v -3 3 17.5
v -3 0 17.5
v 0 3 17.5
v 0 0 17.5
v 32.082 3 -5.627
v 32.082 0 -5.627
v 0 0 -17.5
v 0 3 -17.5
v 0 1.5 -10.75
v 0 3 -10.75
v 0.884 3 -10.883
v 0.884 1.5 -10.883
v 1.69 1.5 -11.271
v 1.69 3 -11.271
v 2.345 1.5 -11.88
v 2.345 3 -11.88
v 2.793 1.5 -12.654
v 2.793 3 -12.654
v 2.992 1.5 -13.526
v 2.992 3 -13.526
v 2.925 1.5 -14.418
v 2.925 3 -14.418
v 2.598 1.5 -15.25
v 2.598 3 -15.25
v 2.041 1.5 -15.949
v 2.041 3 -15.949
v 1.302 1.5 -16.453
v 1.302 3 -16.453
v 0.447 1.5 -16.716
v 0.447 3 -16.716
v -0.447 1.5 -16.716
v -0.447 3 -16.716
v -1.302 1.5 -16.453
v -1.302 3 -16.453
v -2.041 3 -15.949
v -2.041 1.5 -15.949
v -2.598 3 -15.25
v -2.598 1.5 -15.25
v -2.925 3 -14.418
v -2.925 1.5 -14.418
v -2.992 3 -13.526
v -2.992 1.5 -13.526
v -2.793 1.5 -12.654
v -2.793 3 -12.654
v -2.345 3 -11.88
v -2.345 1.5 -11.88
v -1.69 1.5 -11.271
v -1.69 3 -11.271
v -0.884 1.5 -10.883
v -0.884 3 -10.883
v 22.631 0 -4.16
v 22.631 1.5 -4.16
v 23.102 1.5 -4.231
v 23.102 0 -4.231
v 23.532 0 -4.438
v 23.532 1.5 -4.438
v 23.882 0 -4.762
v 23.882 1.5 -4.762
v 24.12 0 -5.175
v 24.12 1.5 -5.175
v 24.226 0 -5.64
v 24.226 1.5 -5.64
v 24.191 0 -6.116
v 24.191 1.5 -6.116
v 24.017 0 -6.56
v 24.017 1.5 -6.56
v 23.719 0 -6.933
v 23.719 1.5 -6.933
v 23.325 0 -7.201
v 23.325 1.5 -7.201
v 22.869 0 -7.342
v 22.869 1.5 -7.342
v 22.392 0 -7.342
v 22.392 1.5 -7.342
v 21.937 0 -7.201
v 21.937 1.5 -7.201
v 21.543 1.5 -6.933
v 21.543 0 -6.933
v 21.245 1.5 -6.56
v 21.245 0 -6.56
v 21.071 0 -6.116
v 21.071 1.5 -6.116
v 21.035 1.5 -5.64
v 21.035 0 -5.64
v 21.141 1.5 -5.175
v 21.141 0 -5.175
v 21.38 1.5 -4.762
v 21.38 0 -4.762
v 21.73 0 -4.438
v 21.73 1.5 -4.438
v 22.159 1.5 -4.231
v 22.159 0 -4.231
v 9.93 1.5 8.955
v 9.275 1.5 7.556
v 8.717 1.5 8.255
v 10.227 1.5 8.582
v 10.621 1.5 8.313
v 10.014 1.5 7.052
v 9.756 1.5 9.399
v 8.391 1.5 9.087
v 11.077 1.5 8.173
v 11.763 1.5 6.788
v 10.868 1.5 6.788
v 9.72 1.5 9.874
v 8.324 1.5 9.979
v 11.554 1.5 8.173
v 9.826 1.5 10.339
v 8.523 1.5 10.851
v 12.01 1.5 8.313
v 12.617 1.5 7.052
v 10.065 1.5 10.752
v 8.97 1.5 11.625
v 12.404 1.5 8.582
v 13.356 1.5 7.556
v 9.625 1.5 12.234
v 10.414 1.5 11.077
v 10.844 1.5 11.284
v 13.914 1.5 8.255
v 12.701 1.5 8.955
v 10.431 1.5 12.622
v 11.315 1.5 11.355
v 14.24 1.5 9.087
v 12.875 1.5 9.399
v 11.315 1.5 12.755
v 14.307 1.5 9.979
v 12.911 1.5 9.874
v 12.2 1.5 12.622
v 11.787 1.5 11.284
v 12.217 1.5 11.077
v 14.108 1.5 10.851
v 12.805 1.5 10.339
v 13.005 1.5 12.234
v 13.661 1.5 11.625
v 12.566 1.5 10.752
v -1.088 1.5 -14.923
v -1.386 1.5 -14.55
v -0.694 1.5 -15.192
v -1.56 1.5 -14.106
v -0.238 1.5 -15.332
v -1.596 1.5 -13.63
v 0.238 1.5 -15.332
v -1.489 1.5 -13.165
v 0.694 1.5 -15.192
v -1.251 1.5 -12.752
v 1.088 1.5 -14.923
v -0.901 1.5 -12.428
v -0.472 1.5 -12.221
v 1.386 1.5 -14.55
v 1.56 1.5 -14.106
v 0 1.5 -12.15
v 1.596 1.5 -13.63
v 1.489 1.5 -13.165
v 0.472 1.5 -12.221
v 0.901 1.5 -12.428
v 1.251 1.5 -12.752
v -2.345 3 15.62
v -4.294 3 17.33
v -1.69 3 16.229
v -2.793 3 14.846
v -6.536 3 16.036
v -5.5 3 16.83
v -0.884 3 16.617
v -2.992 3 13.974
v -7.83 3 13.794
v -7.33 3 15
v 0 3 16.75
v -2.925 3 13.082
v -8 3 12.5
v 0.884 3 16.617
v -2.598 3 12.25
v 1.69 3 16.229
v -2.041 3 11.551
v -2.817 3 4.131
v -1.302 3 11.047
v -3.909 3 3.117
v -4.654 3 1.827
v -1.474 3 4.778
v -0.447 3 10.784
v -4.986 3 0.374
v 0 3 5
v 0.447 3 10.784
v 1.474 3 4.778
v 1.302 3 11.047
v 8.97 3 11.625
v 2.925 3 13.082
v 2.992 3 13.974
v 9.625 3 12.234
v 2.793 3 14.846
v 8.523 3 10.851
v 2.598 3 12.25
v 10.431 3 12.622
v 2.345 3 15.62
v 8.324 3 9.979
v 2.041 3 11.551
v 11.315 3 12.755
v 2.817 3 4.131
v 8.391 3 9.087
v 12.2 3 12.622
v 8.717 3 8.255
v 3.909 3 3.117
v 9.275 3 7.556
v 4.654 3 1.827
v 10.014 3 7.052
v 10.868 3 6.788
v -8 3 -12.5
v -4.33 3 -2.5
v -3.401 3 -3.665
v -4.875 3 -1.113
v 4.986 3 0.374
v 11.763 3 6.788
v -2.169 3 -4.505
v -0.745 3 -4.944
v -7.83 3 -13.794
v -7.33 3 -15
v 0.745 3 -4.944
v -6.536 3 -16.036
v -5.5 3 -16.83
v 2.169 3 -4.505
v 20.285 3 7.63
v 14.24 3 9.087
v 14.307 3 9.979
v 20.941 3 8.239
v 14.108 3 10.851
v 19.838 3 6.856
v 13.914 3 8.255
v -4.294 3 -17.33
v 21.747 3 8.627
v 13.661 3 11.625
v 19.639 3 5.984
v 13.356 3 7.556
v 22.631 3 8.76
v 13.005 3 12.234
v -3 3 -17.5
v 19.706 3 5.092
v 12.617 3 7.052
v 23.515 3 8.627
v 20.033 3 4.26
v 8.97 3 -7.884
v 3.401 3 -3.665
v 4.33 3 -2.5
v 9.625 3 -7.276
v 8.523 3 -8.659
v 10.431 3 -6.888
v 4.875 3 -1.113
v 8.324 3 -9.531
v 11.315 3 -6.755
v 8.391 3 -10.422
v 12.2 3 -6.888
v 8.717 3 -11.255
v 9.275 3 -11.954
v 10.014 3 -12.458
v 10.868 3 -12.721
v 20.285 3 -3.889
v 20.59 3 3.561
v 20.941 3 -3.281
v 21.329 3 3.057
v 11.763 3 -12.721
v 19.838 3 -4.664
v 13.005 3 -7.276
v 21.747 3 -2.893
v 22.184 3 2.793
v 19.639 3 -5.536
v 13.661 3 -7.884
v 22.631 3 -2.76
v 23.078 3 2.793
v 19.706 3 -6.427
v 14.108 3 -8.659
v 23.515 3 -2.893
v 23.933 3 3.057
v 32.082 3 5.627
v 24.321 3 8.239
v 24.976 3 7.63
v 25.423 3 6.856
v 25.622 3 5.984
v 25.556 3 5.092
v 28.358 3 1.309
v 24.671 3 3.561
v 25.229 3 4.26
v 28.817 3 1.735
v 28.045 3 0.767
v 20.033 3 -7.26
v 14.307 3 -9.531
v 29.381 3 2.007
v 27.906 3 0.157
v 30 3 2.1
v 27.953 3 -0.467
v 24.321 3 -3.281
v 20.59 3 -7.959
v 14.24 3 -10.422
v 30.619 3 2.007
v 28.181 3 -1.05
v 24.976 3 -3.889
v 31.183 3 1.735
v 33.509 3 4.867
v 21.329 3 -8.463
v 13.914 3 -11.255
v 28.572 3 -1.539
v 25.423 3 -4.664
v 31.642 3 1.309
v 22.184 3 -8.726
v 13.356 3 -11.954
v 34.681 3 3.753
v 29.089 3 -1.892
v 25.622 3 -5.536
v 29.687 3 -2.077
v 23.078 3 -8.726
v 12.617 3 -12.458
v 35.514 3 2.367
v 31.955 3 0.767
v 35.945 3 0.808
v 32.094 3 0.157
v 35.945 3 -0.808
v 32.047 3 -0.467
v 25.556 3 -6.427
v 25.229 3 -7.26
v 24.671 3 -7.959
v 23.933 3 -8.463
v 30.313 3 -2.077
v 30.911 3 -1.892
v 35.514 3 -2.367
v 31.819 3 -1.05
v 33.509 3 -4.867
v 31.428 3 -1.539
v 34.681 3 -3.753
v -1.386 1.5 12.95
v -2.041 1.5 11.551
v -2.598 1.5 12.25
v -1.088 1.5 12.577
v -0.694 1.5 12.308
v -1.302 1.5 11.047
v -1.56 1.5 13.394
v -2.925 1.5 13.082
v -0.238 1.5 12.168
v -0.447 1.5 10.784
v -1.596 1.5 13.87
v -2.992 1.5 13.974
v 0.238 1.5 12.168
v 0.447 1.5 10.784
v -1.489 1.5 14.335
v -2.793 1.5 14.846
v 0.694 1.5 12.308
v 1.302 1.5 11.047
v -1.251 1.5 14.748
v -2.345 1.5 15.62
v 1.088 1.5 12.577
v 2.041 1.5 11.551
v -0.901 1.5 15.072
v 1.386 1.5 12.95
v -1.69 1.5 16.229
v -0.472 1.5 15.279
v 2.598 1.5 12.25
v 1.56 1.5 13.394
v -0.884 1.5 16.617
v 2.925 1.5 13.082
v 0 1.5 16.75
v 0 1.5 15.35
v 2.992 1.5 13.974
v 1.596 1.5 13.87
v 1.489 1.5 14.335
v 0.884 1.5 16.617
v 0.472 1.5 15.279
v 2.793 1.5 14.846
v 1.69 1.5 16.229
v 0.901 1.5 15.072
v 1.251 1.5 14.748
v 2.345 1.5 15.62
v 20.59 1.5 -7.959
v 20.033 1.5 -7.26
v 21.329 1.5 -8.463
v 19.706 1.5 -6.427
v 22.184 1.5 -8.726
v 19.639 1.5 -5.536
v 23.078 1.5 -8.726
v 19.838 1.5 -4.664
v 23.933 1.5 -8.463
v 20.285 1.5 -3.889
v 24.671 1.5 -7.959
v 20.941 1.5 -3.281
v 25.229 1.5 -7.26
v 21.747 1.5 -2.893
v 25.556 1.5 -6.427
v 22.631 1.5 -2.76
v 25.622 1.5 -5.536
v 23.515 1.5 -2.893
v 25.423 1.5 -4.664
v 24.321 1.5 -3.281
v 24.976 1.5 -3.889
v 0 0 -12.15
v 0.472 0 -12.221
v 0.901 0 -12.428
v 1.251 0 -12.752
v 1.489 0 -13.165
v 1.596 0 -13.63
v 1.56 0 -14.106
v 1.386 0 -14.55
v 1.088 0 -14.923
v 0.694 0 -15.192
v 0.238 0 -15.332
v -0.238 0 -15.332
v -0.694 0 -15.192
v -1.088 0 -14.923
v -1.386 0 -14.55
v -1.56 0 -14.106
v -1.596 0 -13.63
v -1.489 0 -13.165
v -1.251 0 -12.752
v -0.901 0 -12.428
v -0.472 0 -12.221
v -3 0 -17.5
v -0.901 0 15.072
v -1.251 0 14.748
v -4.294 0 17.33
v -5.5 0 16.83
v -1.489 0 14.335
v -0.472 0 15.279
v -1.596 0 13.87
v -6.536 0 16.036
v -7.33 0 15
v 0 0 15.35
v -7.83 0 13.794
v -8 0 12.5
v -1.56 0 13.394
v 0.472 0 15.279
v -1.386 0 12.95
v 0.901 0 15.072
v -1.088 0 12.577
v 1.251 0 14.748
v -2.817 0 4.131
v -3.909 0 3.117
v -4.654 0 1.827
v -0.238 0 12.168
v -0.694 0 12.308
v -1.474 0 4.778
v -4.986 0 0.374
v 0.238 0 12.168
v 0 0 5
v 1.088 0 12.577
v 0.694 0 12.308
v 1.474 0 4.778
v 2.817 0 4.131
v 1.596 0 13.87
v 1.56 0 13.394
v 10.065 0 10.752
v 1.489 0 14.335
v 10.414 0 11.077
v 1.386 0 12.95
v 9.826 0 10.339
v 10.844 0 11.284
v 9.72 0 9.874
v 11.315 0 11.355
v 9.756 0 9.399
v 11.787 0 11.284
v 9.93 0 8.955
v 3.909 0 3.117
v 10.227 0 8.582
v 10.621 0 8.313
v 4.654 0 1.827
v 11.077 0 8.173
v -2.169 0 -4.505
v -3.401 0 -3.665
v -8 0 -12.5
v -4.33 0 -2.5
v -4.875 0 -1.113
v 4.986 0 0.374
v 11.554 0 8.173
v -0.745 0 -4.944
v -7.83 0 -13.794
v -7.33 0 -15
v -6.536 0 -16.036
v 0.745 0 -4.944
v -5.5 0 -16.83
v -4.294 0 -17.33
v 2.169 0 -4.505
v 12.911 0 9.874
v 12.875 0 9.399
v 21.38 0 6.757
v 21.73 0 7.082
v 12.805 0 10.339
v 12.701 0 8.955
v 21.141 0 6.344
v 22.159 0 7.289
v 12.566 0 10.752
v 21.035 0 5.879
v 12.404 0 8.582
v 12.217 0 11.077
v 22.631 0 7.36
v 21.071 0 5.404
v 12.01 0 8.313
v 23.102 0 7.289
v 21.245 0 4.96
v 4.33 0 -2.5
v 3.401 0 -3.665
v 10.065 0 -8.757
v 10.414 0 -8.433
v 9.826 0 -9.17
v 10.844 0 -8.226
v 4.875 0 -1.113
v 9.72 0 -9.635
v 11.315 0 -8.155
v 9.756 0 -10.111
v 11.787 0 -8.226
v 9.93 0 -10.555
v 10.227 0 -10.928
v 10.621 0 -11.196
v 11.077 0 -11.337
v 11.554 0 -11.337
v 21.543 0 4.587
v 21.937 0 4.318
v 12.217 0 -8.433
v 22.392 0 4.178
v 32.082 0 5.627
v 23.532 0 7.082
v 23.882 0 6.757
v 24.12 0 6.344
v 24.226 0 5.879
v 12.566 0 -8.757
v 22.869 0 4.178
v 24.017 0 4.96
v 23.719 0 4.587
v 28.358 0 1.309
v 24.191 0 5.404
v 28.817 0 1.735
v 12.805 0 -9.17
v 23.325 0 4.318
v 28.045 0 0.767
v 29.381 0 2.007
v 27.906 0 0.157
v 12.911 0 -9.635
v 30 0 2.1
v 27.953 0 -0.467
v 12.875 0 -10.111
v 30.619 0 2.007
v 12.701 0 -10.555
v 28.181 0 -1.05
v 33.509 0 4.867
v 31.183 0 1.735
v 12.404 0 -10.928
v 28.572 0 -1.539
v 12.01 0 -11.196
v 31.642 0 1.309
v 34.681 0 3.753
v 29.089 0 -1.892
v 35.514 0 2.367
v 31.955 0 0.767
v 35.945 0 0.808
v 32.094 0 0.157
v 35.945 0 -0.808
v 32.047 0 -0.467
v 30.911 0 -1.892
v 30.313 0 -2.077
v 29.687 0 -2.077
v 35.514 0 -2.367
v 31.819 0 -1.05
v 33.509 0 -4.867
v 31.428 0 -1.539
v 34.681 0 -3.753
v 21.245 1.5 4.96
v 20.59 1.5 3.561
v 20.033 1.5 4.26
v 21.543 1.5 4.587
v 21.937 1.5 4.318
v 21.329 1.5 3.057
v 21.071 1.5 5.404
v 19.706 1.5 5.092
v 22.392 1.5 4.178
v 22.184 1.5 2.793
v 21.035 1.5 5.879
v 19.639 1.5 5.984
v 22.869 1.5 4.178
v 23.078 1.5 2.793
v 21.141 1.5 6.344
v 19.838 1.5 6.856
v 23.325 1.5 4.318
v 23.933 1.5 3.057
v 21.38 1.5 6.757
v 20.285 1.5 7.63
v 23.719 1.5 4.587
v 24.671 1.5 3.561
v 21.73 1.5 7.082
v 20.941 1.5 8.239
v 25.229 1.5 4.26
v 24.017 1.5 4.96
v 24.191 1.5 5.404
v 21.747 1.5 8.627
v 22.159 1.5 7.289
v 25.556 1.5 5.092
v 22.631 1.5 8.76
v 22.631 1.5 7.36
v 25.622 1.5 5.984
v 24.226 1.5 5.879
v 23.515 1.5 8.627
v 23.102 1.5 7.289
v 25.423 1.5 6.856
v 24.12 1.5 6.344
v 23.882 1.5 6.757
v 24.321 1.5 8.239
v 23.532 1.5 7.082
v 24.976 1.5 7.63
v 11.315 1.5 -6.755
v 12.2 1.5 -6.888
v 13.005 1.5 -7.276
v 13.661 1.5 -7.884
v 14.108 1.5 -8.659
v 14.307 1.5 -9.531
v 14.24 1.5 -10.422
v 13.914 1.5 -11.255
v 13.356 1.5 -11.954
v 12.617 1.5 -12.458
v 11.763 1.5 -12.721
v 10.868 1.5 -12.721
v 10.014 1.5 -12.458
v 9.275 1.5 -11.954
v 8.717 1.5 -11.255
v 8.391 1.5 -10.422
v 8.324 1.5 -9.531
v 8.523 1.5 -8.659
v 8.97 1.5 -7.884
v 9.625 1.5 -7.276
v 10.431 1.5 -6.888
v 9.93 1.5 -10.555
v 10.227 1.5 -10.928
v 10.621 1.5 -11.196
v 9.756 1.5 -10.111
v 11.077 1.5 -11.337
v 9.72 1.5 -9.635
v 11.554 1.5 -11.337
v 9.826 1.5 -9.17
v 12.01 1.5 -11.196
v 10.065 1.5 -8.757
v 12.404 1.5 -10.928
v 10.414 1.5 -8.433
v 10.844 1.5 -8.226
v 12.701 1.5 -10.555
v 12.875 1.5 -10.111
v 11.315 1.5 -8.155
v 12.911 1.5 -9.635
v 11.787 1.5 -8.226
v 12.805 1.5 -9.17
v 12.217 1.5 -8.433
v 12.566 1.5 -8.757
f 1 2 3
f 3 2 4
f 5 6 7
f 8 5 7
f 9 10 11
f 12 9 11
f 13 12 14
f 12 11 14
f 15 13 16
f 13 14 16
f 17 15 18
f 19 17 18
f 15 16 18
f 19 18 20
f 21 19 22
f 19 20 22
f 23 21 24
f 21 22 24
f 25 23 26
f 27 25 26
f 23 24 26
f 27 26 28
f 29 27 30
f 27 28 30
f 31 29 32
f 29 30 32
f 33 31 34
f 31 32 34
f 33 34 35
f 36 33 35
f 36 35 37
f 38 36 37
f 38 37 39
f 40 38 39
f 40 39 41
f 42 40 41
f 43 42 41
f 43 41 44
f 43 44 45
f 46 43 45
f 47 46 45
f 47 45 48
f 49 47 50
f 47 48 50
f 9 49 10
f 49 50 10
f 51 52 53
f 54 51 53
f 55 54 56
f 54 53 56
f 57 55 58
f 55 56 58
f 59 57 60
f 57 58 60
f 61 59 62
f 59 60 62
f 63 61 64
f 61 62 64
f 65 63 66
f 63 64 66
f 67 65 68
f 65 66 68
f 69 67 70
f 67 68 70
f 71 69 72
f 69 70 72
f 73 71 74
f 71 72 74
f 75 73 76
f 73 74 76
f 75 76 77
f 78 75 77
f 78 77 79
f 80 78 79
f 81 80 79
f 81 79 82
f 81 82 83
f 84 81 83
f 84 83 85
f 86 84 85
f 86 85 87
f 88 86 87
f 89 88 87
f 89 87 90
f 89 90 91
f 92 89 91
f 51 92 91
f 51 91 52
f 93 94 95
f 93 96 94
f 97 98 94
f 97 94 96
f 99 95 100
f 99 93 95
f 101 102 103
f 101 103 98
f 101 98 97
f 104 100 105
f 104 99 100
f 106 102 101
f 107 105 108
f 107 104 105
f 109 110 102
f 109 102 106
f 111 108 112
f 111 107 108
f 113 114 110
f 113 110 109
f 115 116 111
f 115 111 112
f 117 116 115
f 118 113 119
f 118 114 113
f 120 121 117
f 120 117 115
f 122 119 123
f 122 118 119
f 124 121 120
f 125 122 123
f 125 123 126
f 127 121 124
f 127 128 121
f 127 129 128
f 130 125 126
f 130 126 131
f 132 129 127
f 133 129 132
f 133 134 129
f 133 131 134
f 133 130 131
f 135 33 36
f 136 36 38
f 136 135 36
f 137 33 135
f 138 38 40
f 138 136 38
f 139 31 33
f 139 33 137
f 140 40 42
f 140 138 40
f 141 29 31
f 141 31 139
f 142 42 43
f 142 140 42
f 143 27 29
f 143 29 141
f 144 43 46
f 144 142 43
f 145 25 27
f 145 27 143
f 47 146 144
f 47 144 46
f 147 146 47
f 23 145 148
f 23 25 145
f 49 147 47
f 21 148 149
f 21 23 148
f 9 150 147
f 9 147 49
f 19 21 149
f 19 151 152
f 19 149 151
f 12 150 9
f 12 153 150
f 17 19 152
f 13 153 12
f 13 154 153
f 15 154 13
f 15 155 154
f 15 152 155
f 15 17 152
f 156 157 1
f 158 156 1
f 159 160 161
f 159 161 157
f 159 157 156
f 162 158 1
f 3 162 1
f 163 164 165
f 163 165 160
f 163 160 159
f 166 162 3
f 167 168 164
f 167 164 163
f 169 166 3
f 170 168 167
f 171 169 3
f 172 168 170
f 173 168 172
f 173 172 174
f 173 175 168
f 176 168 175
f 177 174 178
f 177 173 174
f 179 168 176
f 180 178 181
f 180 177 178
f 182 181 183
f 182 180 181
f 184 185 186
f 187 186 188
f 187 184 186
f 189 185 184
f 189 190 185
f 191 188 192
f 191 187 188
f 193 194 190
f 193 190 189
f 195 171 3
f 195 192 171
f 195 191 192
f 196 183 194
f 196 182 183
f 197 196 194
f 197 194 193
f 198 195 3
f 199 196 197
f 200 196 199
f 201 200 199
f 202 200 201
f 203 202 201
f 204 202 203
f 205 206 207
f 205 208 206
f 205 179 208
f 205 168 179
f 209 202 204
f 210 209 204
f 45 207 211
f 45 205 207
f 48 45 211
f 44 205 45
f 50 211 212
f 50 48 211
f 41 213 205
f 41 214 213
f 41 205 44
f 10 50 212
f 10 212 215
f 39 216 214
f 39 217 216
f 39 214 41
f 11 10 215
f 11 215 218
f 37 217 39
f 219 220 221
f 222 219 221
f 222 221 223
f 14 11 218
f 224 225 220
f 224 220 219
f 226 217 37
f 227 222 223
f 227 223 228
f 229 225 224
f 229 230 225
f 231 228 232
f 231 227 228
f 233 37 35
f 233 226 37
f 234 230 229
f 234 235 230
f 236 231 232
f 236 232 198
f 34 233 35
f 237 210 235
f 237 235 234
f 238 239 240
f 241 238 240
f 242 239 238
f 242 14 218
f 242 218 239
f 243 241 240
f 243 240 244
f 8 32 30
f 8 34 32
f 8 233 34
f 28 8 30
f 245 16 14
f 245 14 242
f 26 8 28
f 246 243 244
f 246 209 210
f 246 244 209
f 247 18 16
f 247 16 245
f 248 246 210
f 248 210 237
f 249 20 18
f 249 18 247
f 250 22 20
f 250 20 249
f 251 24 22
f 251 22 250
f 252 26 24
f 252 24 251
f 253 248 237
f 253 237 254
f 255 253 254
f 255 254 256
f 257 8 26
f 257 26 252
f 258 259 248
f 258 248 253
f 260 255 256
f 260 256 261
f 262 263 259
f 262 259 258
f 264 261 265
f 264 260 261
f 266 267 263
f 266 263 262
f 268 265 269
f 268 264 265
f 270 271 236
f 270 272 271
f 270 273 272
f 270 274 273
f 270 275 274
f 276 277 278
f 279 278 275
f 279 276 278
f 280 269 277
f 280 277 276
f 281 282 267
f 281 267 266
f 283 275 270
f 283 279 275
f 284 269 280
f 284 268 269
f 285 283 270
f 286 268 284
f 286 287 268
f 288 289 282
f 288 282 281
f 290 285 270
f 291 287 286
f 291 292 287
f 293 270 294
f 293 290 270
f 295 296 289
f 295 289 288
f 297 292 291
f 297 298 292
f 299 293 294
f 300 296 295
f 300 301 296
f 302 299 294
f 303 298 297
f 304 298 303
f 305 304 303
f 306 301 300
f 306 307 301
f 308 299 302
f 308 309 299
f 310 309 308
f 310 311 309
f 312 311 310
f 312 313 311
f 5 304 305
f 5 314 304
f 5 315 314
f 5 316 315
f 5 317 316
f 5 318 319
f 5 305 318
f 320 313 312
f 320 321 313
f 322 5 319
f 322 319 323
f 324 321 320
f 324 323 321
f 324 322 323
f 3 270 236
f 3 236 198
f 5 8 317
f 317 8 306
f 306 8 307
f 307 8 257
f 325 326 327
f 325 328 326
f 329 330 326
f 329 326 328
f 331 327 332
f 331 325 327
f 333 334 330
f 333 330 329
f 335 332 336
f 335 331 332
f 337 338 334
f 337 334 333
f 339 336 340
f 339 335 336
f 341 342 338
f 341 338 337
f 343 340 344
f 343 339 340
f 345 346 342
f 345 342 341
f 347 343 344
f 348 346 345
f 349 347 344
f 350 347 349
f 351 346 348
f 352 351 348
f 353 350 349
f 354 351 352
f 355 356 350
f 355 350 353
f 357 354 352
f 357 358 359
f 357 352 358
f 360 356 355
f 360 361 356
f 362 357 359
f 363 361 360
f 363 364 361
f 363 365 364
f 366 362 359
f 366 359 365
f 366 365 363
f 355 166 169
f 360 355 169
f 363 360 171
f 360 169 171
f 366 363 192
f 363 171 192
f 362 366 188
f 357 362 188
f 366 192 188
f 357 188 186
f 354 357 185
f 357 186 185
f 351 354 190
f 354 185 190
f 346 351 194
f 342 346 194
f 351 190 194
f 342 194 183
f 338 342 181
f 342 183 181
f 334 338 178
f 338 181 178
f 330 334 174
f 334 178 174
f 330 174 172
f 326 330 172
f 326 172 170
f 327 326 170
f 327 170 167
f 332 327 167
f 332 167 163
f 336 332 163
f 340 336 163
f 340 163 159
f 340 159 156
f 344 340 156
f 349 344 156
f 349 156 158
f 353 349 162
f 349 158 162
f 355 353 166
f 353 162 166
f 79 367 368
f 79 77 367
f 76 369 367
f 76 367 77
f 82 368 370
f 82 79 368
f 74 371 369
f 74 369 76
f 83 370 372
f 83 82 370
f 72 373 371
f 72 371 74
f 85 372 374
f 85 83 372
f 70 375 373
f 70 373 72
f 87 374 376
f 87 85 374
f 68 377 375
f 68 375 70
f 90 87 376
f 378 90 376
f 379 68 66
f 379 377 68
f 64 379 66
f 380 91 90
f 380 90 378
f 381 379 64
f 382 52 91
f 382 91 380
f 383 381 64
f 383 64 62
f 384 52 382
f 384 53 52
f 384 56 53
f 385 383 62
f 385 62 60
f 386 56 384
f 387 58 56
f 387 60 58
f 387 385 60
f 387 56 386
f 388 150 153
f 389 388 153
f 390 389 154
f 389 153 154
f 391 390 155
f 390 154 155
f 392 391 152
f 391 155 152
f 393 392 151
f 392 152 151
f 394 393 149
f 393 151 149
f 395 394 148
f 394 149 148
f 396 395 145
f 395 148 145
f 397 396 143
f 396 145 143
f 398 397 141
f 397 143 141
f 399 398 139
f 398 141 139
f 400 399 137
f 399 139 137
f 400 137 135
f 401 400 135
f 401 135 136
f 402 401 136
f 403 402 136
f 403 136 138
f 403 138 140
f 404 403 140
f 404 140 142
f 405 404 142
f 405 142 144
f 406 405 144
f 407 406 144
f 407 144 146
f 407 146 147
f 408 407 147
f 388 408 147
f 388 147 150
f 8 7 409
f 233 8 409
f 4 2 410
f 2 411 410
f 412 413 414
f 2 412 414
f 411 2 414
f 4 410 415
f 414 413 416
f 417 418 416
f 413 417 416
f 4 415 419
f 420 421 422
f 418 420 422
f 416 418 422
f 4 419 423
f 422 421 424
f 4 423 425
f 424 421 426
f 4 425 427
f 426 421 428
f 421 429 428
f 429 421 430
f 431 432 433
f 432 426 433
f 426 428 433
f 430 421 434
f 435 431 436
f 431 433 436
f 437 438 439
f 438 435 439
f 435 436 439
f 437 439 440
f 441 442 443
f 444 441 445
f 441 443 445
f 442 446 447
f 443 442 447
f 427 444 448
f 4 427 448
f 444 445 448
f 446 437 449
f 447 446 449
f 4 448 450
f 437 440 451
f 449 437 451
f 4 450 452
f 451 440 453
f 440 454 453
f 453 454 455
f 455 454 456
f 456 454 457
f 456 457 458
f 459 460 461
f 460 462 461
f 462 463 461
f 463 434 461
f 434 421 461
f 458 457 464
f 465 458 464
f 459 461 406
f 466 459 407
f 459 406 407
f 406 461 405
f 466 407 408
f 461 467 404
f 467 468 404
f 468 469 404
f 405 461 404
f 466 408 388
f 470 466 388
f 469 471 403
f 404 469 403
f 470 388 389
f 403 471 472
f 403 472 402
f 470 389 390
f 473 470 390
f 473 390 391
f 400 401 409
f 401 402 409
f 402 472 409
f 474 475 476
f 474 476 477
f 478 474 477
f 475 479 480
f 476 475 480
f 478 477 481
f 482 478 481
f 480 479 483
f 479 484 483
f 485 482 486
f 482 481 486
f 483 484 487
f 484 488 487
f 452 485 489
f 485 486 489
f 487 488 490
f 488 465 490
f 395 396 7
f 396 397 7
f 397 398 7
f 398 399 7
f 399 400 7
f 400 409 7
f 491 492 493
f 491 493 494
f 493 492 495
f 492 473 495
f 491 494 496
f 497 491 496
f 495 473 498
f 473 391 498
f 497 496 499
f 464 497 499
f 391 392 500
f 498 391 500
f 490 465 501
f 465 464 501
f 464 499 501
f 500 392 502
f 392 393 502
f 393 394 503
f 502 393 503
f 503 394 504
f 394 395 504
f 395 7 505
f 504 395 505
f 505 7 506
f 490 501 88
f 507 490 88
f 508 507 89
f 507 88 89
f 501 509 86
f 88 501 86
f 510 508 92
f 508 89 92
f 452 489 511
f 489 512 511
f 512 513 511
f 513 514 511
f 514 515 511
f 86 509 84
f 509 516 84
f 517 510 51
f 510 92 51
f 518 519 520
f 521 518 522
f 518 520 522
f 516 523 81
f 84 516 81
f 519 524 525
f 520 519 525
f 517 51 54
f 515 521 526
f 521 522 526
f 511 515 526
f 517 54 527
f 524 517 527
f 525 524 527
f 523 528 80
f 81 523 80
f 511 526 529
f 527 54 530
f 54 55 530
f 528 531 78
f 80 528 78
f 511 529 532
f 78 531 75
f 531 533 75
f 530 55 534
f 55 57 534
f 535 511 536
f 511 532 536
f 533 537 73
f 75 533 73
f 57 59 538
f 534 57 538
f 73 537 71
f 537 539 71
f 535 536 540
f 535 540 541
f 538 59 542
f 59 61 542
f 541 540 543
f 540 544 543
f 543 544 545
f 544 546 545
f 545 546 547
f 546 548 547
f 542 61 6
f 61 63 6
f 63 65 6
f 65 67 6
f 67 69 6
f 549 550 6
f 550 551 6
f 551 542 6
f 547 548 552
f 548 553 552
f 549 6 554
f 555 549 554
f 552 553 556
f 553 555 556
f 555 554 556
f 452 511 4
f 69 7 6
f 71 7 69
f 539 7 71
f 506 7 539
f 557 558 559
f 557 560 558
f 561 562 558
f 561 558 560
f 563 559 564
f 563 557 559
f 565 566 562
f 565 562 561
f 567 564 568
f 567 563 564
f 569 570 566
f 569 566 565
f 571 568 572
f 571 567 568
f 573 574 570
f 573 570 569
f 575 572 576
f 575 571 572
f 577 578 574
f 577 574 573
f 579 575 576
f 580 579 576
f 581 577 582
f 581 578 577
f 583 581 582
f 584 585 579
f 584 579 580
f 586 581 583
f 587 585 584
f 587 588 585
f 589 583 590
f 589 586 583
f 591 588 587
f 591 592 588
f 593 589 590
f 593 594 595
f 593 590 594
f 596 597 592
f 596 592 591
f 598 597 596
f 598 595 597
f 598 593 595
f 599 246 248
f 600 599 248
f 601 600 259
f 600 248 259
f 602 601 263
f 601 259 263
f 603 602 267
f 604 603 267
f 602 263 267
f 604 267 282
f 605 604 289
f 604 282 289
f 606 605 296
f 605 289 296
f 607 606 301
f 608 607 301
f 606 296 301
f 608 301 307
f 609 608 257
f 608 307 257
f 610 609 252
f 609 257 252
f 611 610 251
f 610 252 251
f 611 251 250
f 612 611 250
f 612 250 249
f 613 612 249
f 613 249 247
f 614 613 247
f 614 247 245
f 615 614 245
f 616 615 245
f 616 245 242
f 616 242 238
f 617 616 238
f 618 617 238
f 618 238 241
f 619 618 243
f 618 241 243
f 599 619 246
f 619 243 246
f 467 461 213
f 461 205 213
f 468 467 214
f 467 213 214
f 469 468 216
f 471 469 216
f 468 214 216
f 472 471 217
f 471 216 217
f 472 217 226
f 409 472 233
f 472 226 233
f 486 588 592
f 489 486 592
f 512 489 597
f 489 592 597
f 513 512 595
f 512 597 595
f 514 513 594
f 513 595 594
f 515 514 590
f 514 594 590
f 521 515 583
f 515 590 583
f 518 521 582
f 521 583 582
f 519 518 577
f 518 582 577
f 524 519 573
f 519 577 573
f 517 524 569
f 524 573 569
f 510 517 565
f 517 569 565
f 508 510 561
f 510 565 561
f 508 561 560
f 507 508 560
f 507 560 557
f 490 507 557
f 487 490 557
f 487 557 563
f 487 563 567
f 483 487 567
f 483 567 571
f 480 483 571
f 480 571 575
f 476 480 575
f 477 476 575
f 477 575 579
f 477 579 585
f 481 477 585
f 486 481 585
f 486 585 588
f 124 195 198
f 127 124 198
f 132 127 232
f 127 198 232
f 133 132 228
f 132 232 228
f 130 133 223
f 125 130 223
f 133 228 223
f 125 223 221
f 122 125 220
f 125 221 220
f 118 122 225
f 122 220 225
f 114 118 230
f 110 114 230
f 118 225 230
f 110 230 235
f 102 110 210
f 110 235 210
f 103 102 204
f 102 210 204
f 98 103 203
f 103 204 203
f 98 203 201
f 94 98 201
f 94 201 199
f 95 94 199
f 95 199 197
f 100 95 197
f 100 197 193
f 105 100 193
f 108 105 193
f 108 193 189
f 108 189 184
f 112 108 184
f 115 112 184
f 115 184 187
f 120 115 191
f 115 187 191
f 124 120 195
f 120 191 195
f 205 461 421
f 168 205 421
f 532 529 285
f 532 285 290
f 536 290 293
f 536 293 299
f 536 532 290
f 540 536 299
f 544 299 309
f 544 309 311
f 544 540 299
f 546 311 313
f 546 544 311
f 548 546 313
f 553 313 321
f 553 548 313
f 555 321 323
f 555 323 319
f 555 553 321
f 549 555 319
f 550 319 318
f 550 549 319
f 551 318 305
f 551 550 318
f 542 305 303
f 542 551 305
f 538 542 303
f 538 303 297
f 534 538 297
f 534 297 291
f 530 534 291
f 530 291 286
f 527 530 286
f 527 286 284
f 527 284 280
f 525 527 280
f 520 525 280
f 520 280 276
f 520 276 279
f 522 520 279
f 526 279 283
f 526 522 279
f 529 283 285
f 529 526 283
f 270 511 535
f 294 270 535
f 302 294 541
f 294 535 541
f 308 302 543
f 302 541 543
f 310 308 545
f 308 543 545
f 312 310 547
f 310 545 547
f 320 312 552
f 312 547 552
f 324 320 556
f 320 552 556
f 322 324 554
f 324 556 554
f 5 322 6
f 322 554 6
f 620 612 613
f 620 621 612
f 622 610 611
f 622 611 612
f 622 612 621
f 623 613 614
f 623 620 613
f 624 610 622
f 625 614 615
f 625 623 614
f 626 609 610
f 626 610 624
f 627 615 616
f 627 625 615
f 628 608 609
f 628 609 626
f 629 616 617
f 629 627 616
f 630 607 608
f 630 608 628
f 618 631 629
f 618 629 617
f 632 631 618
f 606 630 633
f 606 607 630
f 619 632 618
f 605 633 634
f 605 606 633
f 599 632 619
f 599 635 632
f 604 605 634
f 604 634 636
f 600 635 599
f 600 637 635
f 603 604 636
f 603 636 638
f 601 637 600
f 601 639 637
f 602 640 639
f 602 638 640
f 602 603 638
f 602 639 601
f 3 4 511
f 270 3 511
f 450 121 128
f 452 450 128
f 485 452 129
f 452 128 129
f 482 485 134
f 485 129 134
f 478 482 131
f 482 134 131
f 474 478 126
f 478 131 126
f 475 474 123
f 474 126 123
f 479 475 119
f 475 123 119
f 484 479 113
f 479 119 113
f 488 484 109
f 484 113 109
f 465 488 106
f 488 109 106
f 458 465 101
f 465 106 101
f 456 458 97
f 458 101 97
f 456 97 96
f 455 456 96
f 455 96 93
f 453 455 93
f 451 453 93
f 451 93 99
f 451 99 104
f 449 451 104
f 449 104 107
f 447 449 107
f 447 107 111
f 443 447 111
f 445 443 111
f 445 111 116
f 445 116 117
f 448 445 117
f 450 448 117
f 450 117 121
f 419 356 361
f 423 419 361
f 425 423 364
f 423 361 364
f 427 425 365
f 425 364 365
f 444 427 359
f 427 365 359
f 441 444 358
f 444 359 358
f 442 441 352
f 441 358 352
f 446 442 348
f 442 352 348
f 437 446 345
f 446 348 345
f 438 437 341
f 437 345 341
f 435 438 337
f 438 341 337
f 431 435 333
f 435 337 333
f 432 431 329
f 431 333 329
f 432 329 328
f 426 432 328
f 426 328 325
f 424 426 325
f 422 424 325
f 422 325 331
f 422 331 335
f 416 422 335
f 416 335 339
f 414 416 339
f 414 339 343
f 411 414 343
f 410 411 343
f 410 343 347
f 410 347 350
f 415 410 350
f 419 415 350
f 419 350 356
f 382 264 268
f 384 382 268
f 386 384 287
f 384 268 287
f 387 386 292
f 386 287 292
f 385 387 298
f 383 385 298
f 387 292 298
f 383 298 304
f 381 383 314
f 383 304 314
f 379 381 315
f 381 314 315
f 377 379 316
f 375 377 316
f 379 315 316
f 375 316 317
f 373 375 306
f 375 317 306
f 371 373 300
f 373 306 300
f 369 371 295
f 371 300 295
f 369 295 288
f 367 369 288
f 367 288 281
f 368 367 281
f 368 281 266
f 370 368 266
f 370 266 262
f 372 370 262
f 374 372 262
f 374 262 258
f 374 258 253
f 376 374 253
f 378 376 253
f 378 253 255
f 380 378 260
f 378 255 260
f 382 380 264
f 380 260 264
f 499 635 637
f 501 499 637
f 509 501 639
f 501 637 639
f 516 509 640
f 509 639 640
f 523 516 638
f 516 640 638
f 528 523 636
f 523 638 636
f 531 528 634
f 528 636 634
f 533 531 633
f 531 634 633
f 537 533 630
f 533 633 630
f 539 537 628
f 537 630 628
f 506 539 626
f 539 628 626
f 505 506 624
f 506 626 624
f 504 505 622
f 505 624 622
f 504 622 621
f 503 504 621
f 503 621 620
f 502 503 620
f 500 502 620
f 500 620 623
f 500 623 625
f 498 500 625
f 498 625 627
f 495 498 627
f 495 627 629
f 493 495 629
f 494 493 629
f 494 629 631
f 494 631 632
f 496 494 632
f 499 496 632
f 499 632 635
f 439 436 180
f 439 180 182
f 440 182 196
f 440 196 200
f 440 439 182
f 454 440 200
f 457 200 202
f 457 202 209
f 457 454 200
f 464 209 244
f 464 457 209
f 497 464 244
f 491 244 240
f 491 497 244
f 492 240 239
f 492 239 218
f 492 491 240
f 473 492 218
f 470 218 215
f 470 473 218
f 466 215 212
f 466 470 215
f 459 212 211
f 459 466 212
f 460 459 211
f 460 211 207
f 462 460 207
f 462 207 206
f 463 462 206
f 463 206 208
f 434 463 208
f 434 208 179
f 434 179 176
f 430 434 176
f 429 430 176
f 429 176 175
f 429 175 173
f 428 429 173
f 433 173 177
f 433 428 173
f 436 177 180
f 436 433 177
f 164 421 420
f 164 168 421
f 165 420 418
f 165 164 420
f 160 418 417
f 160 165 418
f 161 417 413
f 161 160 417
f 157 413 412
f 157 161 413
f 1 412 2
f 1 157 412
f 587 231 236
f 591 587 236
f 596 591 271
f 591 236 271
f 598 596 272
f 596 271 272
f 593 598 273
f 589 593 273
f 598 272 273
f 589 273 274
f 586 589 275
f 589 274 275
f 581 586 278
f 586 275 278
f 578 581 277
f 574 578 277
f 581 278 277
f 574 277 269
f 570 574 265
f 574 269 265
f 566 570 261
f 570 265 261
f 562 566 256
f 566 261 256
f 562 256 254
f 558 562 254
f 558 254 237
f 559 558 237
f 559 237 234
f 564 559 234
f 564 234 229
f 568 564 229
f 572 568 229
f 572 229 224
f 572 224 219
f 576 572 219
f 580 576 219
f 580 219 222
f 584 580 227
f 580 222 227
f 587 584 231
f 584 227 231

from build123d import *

# Parameters (mm, degrees)
SKETCH1_R           = 2.1
SKETCH1_R_2         = 5
BOSS_EXTRUDE1_DEPTH = 3
SKETCH3_R           = 1.6
CUT_EXTRUDE1_DEPTH  = 10
FILLET1_R           = 5
SKETCH4_R           = 3
CUT_EXTRUDE2_DEPTH  = 1.5


with BuildPart() as part:
    # Sketch1 → Boss-Extrude1 (new body)
    with BuildSketch(Plane(origin=(0, 0, 0), x_dir=(1, 0, 0), z_dir=(0, 1, 0))):
        with BuildLine():
            Line((-8, 17.5), (-8, -17.5))
            Line((-8, -17.5), (0, -17.5))
            Line((0, -17.5), (32.082434223, -5.627030097))
            ThreePointArc((32.082434223, -5.627030097), (36, 0), (32.082434223, 5.627030097))
            Line((32.082434223, 5.627030097), (0, 17.5))
            Line((0, 17.5), (-8, 17.5))
        make_face()
        with Locations(Location((30, 0, 0), (0, 0, 270))):
            Circle(SKETCH1_R, mode=Mode.SUBTRACT)
        with Locations(Location((0, 0, 0), (0, 0, 270))):
            Circle(SKETCH1_R_2, mode=Mode.SUBTRACT)
    extrude(amount=BOSS_EXTRUDE1_DEPTH)

    # Sketch3 → Cut-Extrude1 (cut)
    with BuildSketch(Plane(origin=(0, 3, 0), x_dir=(1, 0, 0), z_dir=(0, 1, 0))):
        with Locations(Location((0, 13.75, 0), (0, 0, 270))):
            Circle(SKETCH3_R)
        with Locations(Location((11.315438541, 9.754896669, 0), (0, 0, 270))):
            Circle(SKETCH3_R)
        with Locations(Location((22.630877082, 5.759793337, 0), (0, 0, 270))):
            Circle(SKETCH3_R)
        with Locations(Location((22.630877082, -5.759793337, 0), (0, 0, 270))):
            Circle(SKETCH3_R)
        with Locations(Location((0, -13.75, 0), (0, 0, 270))):
            Circle(SKETCH3_R)
        with Locations(Location((11.315438541, -9.754896669, 0), (0, 0, 270))):
            Circle(SKETCH3_R)
    extrude(amount=-CUT_EXTRUDE1_DEPTH, mode=Mode.SUBTRACT)

    # Fillet1
    fillet1_edges = [part.edges().sort_by_distance(p)[0] for p in [
        (-8, 1.5, 17.5),
        (-8, 1.5, -17.5),
    ]]
    fillet(fillet1_edges, radius=FILLET1_R)

    # Sketch4 → Cut-Extrude2 (cut)
    with BuildSketch(Plane(origin=(0, 3, 0), x_dir=(1, 0, 0), z_dir=(0, 1, 0))):
        with Locations(Location((0, 13.75, 0), (0, 0, 270))):
            Circle(SKETCH4_R)
        with Locations(Location((11.315438541, 9.754896669, 0), (0, 0, 270))):
            Circle(SKETCH4_R)
        with Locations(Location((22.630877082, 5.759793337, 0), (0, 0, 270))):
            Circle(SKETCH4_R)
        with Locations(Location((22.630877082, -5.759793337, 0), (0, 0, 270))):
            Circle(SKETCH4_R)
        with Locations(Location((11.315438541, -9.754896669, 0), (0, 0, 270))):
            Circle(SKETCH4_R)
        with Locations(Location((0, -13.75, 0), (0, 0, 270))):
            Circle(SKETCH4_R)
    extrude(amount=-CUT_EXTRUDE2_DEPTH, mode=Mode.SUBTRACT)


solid = part.part
